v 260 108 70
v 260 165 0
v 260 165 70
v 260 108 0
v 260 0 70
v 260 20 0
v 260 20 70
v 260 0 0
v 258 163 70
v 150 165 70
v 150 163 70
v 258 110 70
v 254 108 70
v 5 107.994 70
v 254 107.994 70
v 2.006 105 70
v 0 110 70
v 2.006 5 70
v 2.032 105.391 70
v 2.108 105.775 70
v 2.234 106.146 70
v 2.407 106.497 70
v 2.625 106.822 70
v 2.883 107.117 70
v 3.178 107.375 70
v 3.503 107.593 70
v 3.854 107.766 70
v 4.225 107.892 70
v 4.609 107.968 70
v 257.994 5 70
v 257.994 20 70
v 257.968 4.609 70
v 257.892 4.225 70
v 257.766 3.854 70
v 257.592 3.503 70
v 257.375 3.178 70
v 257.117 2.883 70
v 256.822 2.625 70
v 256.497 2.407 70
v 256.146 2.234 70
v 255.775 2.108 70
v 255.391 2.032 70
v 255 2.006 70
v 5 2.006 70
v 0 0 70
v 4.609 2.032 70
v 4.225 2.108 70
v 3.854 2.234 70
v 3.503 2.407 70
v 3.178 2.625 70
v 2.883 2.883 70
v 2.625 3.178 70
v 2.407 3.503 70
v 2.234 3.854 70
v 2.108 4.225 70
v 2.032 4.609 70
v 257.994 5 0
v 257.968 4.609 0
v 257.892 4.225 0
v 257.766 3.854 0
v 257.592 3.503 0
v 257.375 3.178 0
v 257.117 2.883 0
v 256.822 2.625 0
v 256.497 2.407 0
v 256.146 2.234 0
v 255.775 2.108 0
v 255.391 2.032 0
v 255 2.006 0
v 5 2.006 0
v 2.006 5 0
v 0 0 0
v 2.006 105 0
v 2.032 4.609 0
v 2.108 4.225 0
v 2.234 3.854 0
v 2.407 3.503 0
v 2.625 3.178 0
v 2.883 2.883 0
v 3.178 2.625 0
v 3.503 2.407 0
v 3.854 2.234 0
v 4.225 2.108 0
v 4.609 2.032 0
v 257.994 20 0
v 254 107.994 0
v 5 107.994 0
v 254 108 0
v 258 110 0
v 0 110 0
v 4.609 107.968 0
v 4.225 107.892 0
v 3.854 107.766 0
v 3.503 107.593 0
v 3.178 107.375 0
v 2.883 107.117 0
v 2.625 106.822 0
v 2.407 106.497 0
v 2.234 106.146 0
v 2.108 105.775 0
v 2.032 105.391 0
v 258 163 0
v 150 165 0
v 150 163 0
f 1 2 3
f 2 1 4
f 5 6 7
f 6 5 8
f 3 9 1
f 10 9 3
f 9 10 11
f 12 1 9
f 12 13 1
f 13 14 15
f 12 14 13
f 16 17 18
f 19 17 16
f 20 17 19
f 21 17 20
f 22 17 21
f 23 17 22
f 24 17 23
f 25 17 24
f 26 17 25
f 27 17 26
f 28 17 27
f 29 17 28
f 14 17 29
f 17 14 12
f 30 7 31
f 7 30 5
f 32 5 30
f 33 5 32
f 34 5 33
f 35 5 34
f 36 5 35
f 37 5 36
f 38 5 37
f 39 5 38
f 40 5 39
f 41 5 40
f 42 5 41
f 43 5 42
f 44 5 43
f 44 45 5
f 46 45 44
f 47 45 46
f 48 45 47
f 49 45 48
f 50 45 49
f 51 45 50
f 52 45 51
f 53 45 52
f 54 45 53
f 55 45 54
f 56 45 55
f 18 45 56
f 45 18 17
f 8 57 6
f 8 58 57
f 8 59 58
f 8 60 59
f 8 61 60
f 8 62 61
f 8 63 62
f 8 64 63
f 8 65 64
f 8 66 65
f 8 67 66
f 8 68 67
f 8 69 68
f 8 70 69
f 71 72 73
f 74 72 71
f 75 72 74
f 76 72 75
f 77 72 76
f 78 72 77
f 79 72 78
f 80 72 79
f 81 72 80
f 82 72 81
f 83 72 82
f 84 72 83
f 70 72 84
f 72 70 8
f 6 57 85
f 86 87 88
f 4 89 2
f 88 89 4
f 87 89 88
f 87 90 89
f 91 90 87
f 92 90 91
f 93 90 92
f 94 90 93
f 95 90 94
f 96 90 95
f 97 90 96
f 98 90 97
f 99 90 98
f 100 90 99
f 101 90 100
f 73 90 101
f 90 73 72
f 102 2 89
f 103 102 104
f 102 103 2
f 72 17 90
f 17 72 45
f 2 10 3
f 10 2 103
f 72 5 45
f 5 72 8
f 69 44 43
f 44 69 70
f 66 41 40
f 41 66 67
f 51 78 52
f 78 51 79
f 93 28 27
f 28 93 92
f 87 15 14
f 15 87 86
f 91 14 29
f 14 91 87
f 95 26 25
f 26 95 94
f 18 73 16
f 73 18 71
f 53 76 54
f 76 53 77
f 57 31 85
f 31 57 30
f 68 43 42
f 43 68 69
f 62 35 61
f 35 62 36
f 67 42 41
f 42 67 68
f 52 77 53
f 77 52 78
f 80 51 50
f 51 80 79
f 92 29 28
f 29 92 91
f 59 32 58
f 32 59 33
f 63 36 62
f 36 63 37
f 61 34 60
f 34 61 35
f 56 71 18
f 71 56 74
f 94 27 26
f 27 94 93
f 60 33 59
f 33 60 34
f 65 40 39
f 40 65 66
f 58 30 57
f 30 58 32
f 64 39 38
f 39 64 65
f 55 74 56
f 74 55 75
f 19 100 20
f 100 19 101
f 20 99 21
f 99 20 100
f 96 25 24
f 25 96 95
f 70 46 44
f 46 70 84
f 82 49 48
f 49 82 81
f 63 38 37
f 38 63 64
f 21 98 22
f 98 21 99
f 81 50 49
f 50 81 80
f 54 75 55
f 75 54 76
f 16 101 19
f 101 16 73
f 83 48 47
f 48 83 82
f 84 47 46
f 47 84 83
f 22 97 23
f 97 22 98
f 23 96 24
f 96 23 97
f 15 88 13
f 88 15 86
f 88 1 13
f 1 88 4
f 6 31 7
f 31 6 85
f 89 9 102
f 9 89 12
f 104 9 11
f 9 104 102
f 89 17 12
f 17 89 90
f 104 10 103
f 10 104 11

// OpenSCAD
/*

Creator
*****************

Constantin Ganshin

Project name:
*****************
closet_floating_shelf

Description:

    Closets shelf that will attached under the shelf
                                  ________
                                          |
                                          |
             -----------------------------
            |
            |                           
            |                             |
             -----------------------------                   
*/

// Resolution variables
$fa = 1;
$fs = 0.4;

// Main dimension variables
hook_top_x = 100; // Length of the upper part (that will be on top of the shelf)
closet_shelf_thickness_y = 50; // Thickness of the actual closet shelf
hook_shelf_bottom_x = 250; // Length of the bottom part (that will be on the bottom of the shelf) and the bottom part of the floating shelf
floating_shelf_thickness_y = 100; // Thickness (the gap for the things that will be put on the shelf) of the floating shelf
shelf_closer_y = floating_shelf_thickness_y * 0.15; // The part that closes the floating shelf and prevents from things to slide from the shelf)
wall_thickness = 5; // Walls are in addition to the rest of measurements 
shelf_thickness_z = 70;
round_corners_radius = 3;
wall_thickness_udjust_for_round_corners = wall_thickness - round_corners_radius;


module closet_floating_shelf(){
    difference(){
        cube([hook_shelf_bottom_x + (wall_thickness * 2), (wall_thickness * 3) + floating_shelf_thickness_y + closet_shelf_thickness_y, shelf_thickness_z]);
        // Shelf cutout
        translate([wall_thickness, wall_thickness, -1])
            minkowski(){
                cube([hook_shelf_bottom_x, floating_shelf_thickness_y, shelf_thickness_z + 2]);
                sphere(round_corners_radius);
            }
        // Closer cutout    
        translate([wall_thickness + hook_shelf_bottom_x - 1, wall_thickness + shelf_closer_y, -1])
            cube([wall_thickness + 2, floating_shelf_thickness_y - shelf_closer_y + wall_thickness_udjust_for_round_corners + 1, shelf_thickness_z + 2]); 
        // Hook cutout
        translate([-1, (wall_thickness * 2) + floating_shelf_thickness_y, -1])
            cube([wall_thickness + hook_shelf_bottom_x + 1 + round_corners_radius, closet_shelf_thickness_y + round_corners_radius, shelf_thickness_z + 2 ]);
        //Hook cutout 2nd part    
        translate([-1, (wall_thickness * 2) + floating_shelf_thickness_y + closet_shelf_thickness_y - 1, -1])
            cube([hook_shelf_bottom_x - hook_top_x + 1, wall_thickness + 2, shelf_thickness_z + 2]);   
    }
}

// Generate the shape
closet_floating_shelf();
